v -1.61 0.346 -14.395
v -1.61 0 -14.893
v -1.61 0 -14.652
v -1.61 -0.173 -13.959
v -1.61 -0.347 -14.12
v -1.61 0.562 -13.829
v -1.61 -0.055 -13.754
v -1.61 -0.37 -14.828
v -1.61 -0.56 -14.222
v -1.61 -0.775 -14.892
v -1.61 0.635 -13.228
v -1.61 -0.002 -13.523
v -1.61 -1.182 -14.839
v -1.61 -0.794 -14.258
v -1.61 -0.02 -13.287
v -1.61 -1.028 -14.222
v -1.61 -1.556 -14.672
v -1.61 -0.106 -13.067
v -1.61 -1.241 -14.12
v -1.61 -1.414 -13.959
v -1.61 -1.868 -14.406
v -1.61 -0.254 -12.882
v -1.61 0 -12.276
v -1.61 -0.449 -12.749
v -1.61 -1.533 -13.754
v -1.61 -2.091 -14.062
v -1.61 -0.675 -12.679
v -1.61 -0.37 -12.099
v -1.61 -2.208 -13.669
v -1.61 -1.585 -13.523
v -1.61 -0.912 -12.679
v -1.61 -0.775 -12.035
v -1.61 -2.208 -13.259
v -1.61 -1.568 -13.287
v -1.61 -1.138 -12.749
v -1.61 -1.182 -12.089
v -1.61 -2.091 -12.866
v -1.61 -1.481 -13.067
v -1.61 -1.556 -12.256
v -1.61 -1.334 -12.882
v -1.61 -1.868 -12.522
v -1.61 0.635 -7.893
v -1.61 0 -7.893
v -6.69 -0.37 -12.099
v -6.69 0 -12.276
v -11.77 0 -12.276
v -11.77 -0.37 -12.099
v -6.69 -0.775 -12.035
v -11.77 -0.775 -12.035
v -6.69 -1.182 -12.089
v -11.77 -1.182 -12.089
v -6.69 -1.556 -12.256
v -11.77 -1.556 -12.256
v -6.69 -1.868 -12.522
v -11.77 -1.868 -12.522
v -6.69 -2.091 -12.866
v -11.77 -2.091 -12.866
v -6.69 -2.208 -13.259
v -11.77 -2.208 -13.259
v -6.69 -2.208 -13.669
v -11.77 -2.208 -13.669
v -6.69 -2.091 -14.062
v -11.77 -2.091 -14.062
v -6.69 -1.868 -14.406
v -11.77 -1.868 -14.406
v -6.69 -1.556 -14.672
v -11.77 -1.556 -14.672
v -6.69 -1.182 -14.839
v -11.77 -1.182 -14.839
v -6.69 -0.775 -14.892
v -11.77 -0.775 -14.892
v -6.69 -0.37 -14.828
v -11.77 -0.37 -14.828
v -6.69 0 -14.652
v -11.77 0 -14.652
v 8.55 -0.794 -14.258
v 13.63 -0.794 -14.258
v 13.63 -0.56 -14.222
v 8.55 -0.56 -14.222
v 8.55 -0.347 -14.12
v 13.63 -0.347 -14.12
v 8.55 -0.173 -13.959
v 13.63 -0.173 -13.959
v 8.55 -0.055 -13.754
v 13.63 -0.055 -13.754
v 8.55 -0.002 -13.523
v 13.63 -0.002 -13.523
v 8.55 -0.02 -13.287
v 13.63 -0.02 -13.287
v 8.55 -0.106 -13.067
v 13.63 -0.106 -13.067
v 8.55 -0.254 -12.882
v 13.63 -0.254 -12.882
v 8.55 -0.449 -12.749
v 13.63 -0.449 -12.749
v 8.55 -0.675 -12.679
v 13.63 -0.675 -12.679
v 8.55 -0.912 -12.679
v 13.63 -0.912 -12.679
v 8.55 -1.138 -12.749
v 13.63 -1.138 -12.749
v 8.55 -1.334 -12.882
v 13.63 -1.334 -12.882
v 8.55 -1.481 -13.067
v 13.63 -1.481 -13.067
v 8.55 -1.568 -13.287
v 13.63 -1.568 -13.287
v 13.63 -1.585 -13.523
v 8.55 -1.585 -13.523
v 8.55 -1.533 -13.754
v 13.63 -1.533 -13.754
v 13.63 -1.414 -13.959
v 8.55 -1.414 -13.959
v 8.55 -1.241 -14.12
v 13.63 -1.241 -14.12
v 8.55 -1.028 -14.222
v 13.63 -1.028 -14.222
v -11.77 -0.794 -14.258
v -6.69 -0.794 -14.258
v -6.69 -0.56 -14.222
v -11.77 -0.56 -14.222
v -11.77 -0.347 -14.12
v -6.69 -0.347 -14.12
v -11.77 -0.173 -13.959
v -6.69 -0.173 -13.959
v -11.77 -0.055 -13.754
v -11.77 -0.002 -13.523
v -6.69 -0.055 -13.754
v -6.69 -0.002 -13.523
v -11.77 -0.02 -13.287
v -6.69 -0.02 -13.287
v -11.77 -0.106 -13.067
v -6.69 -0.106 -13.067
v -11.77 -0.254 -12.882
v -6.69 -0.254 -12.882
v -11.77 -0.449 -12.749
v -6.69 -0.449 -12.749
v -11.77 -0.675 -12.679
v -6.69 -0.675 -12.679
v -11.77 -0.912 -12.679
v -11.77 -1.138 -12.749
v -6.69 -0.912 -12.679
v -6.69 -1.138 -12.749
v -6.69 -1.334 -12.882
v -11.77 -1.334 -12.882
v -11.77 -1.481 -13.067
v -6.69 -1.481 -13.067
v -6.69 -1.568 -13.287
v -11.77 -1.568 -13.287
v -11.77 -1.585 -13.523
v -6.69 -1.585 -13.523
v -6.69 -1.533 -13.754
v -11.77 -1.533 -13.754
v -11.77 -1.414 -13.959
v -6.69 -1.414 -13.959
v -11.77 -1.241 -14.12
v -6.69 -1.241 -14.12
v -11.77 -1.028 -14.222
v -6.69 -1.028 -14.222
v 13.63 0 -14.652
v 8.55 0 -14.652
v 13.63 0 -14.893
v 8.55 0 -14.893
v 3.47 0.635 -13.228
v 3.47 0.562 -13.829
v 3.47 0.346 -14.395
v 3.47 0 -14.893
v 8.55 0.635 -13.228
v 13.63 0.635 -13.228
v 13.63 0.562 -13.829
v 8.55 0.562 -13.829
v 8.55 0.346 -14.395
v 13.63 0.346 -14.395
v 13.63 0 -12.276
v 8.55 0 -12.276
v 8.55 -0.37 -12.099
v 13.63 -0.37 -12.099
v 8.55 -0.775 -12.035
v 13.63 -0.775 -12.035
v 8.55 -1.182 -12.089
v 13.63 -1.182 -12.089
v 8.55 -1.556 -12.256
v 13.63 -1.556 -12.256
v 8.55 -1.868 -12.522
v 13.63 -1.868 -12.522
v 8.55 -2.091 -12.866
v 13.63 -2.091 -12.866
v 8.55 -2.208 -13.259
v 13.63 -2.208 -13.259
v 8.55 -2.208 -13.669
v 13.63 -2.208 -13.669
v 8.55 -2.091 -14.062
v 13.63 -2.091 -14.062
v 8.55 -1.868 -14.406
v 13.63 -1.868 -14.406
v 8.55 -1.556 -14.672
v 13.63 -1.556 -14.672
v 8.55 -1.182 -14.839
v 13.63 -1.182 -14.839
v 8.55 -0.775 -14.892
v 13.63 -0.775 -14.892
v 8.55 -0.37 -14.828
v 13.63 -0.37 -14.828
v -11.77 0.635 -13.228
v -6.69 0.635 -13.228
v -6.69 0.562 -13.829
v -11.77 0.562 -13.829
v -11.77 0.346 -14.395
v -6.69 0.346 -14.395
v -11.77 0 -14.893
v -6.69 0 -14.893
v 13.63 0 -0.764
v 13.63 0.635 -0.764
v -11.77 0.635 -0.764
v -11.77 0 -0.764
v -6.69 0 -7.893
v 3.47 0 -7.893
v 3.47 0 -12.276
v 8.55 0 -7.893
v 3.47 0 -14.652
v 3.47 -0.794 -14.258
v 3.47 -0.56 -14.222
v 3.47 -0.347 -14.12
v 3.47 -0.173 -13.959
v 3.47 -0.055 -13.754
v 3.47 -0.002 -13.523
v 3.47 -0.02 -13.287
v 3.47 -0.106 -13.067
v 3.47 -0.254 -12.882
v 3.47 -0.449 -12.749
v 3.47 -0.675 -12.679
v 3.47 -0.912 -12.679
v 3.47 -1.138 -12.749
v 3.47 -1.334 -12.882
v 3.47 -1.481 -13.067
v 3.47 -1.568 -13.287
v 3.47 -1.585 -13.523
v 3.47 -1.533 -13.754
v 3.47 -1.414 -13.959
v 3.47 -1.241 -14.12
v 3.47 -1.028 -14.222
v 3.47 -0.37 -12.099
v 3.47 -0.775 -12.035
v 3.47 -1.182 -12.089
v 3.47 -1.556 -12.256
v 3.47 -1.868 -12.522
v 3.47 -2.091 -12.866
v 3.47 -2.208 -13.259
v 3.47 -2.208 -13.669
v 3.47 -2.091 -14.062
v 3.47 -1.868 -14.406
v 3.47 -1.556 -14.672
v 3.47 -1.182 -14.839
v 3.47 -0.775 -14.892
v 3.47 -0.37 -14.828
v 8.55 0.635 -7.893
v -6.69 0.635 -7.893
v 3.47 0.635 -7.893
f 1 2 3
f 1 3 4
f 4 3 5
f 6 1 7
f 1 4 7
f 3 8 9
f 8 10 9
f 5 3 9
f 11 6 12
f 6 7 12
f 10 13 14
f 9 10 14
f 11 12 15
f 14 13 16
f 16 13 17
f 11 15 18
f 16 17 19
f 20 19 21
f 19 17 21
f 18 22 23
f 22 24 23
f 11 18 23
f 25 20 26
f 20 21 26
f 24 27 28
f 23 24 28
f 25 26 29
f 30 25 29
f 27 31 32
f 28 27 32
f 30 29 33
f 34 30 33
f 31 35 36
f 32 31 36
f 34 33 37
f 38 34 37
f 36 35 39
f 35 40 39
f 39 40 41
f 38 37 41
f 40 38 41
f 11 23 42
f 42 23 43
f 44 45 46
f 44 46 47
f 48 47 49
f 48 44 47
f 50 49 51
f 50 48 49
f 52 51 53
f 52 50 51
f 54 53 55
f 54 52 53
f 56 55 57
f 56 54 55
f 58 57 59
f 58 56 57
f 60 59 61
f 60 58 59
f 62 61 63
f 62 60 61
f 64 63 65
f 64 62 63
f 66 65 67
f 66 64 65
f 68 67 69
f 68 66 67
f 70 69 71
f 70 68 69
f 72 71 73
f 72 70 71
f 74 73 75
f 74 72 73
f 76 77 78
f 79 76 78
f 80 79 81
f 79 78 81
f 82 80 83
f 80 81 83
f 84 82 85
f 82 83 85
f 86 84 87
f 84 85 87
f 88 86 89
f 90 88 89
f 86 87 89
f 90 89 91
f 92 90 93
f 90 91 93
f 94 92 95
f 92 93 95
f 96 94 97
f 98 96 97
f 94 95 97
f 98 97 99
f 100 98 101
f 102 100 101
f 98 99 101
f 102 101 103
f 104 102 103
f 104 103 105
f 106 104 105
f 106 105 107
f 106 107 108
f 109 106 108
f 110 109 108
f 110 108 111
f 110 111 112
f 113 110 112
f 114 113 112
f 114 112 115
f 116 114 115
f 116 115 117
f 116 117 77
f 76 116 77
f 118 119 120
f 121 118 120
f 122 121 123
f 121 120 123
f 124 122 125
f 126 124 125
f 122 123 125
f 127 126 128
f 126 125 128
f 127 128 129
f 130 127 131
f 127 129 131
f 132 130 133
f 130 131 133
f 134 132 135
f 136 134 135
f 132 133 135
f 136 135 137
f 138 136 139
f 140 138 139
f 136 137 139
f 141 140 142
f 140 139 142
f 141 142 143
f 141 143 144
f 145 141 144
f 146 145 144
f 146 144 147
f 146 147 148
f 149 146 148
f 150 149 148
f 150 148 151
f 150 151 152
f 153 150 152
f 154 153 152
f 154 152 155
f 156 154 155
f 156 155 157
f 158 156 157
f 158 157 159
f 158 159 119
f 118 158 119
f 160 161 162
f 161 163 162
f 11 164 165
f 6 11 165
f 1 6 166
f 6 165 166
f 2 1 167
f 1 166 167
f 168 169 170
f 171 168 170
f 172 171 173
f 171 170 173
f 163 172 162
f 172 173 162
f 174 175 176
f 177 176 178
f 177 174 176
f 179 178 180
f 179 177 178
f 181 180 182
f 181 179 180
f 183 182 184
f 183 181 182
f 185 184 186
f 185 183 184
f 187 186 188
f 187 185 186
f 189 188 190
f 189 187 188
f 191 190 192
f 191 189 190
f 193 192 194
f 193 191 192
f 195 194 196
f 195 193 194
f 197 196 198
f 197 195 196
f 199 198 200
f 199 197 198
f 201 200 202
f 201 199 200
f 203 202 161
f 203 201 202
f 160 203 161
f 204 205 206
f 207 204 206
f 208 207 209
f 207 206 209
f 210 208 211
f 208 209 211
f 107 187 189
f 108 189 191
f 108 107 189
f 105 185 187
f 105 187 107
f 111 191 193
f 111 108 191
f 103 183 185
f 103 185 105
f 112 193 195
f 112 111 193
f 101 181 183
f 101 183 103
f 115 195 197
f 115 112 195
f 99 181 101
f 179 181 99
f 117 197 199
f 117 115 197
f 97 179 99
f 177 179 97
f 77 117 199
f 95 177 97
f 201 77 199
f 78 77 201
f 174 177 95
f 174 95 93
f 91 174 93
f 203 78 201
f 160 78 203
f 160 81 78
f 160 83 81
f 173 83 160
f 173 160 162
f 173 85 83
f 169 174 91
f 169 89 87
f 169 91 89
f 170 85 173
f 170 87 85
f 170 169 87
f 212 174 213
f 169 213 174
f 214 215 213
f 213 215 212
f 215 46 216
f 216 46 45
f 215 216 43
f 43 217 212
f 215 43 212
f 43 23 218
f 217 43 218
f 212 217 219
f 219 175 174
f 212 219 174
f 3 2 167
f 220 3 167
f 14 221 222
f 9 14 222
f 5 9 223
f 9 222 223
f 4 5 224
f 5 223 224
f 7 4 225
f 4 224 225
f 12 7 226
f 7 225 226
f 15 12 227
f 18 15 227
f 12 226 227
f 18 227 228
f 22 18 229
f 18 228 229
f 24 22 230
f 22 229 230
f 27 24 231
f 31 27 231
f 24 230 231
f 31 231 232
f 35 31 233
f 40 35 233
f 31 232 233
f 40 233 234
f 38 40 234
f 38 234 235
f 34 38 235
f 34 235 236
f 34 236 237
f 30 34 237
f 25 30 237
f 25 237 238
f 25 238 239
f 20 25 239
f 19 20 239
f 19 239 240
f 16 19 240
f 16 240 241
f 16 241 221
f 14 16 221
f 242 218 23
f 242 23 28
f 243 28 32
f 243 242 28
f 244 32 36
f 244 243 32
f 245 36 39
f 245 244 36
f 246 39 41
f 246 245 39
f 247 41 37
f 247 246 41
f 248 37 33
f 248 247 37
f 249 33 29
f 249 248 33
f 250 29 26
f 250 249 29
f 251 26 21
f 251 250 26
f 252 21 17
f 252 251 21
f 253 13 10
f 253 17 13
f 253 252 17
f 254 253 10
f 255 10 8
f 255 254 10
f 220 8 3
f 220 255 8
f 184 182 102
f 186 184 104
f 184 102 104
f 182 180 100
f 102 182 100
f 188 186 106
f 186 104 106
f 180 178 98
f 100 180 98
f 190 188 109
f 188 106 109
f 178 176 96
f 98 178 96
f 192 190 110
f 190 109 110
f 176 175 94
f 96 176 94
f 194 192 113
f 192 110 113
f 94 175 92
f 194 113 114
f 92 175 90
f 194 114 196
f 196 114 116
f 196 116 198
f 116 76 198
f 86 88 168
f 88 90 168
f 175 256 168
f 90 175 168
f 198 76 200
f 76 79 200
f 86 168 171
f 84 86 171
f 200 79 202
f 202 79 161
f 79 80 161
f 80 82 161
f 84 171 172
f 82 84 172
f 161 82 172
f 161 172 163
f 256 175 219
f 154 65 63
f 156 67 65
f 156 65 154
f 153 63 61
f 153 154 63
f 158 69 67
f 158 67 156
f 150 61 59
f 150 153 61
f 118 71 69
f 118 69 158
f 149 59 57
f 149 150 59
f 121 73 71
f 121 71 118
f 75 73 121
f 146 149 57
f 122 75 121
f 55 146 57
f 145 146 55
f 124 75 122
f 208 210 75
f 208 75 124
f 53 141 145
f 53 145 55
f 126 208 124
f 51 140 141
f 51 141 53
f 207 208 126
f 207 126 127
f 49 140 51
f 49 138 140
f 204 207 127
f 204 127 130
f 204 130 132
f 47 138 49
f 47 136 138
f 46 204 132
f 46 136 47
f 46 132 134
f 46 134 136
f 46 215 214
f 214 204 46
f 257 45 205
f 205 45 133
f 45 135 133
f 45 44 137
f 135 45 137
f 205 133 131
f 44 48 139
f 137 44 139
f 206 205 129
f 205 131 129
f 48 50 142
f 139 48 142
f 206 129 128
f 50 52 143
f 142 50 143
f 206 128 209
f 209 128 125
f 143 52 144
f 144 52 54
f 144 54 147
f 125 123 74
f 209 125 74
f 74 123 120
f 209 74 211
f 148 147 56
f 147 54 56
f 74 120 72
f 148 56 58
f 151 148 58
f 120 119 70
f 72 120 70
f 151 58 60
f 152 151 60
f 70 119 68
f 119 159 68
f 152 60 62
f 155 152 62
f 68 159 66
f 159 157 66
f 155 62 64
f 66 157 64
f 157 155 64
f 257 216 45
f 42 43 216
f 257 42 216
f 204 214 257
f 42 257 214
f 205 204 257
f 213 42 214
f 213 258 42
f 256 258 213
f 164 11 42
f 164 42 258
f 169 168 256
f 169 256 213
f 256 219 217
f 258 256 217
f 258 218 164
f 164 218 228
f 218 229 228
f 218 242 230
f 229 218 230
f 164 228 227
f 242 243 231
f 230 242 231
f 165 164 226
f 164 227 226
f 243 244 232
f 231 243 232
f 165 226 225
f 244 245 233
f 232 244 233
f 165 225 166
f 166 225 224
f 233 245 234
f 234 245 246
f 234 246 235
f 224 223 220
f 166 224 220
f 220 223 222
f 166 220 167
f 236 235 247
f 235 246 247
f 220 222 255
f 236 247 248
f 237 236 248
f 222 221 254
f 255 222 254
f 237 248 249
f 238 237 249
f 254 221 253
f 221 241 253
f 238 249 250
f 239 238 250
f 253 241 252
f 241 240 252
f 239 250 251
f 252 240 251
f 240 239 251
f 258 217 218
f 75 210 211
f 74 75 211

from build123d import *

# Parameters (mm, degrees)
BOSS_EXTRUDE1_DEPTH = 0.635
BOSS_EXTRUDE2_REACH = 31.451
SKETCH2_R           = 1.42875
SKETCH3_W           = 5.08
SKETCH3_H           = 7
CUT_EXTRUDE1_DEPTH  = 40
SKETCH4_R           = 0.79375
CUT_EXTRUDE2_DEPTH  = 40
FILLET1_R           = 2.5


with BuildPart() as part:
    # Sketch1 → Boss-Extrude1 (new body)
    with BuildSketch(Plane(origin=(0, 0, 0), x_dir=(1, 0, 0), z_dir=(0, 1, 0))):
        Polygon((-6.689871172, 14.89260144), (-11.769871172, 14.89260144), (-11.769871172, 0.76385144), (13.630128828, 0.76385144), (13.630128828, 14.89260144), (8.550128828, 14.89260144), (8.550128828, 7.89260144), (3.470128828, 7.89260144), (3.470128828, 14.89260144), (-1.609871172, 14.89260144), (-1.609871172, 7.89260144), (-6.689871172, 7.89260144), align=None)
    extrude(amount=BOSS_EXTRUDE1_DEPTH)

    # Boss-Extrude2: up to this face of the body (flat: up to its plane)
    boss_extrude2_end = Plane(part.part.faces().sort_by_distance((-11.769871172, 0.3175, -7.82822644))[0])
    # Sketch2 → Boss-Extrude2 (add, up to the picked face)
    with BuildSketch(Plane(origin=(13.630128828, 0, 0), x_dir=(0, 0, -1), z_dir=(1, 0, 0)), mode=Mode.PRIVATE) as boss_extrude2_sk1:
        with Locations(Location((13.46385144, -0.79375, 0), (0, 0, 33.748988596))):
            Circle(SKETCH2_R)
    boss_extrude2_tool1 = split(extrude(boss_extrude2_sk1.sketch, amount=-BOSS_EXTRUDE2_REACH, mode=Mode.PRIVATE), bisect_by=boss_extrude2_end, keep=Keep.BOTH, mode=Mode.PRIVATE)
    add(boss_extrude2_tool1.solids().sort_by(Axis((13.630129, -0.79375, -13.463851), (-1, 0, 0)))[0])

    # Sketch3 → Cut-Extrude1 (cut)
    with BuildSketch(Plane(origin=(0, 0.635, 0), x_dir=(1, 0, 0), z_dir=(0, 1, 0))):
        with Locations((-4.149871172, 11.39260144)):
            Rectangle(SKETCH3_W, SKETCH3_H)
        with Locations((6.010128828, 11.39260144)):
            Rectangle(SKETCH3_W, SKETCH3_H)
    extrude(amount=-CUT_EXTRUDE1_DEPTH, mode=Mode.SUBTRACT)

    # Sketch4 → Cut-Extrude2 (cut)
    with BuildSketch(Plane(origin=(13.630128828, 0, 0), x_dir=(0, 0, -1), z_dir=(1, 0, 0))):
        with Locations((13.46385144, -0.79375)):
            Circle(SKETCH4_R)
    extrude(amount=-CUT_EXTRUDE2_DEPTH, mode=Mode.SUBTRACT)

    # Fillet1
    # the kernel refuses this fillet: 2.5 mm, written as the material it takes off along each edge
    with BuildSketch(Plane(origin=(-2.527709024, 0.635, -14.89260144), x_dir=(0, 0, 1), z_dir=(-1, 0, 0)), Plane(origin=(7.632290976, 0.635, -14.89260144), x_dir=(0, 0, 1), z_dir=(-1, 0, 0))) as fillet1_piece_1:
        with BuildLine():
            CenterArc((1.664864859, -2.5), FILLET1_R, 90, 41.754936598)
            Line((0, -0.635), (-0.033297297, -0.5977))
            ThreePointArc((-0.033297297, -0.5977), (-0.05, -0.3175), (-0.05, 0))
            Line((-0.05, 0), (0, 0.05))
            Line((0, 0.05), (1.664864859, 0.05))
            Line((1.664864859, 0.05), (1.664864859, 0))
        make_face()
    extrude(amount=13.404324297, mode=Mode.SUBTRACT)
    with BuildSketch(Plane(origin=(17.792290976, 0.635, -14.89260144), x_dir=(0, -1, 0), z_dir=(-1, 0, 0))) as fillet1_piece_2:
        with BuildLine():
            CenterArc((2.5, 1.664864859), FILLET1_R, 180, 41.754936598)
            Line((0, 1.664864859), (-0.05, 1.664864859))
            Line((-0.05, 1.664864859), (-0.05, 0))
            Line((-0.05, 0), (0, -0.05))
            ThreePointArc((0, -0.05), (0.3175, -0.05), (0.5977, -0.033297297))
            Line((0.5977, -0.033297297), (0.635, 0))
        make_face()
    extrude(amount=13.404324297, mode=Mode.SUBTRACT)


solid = part.part
